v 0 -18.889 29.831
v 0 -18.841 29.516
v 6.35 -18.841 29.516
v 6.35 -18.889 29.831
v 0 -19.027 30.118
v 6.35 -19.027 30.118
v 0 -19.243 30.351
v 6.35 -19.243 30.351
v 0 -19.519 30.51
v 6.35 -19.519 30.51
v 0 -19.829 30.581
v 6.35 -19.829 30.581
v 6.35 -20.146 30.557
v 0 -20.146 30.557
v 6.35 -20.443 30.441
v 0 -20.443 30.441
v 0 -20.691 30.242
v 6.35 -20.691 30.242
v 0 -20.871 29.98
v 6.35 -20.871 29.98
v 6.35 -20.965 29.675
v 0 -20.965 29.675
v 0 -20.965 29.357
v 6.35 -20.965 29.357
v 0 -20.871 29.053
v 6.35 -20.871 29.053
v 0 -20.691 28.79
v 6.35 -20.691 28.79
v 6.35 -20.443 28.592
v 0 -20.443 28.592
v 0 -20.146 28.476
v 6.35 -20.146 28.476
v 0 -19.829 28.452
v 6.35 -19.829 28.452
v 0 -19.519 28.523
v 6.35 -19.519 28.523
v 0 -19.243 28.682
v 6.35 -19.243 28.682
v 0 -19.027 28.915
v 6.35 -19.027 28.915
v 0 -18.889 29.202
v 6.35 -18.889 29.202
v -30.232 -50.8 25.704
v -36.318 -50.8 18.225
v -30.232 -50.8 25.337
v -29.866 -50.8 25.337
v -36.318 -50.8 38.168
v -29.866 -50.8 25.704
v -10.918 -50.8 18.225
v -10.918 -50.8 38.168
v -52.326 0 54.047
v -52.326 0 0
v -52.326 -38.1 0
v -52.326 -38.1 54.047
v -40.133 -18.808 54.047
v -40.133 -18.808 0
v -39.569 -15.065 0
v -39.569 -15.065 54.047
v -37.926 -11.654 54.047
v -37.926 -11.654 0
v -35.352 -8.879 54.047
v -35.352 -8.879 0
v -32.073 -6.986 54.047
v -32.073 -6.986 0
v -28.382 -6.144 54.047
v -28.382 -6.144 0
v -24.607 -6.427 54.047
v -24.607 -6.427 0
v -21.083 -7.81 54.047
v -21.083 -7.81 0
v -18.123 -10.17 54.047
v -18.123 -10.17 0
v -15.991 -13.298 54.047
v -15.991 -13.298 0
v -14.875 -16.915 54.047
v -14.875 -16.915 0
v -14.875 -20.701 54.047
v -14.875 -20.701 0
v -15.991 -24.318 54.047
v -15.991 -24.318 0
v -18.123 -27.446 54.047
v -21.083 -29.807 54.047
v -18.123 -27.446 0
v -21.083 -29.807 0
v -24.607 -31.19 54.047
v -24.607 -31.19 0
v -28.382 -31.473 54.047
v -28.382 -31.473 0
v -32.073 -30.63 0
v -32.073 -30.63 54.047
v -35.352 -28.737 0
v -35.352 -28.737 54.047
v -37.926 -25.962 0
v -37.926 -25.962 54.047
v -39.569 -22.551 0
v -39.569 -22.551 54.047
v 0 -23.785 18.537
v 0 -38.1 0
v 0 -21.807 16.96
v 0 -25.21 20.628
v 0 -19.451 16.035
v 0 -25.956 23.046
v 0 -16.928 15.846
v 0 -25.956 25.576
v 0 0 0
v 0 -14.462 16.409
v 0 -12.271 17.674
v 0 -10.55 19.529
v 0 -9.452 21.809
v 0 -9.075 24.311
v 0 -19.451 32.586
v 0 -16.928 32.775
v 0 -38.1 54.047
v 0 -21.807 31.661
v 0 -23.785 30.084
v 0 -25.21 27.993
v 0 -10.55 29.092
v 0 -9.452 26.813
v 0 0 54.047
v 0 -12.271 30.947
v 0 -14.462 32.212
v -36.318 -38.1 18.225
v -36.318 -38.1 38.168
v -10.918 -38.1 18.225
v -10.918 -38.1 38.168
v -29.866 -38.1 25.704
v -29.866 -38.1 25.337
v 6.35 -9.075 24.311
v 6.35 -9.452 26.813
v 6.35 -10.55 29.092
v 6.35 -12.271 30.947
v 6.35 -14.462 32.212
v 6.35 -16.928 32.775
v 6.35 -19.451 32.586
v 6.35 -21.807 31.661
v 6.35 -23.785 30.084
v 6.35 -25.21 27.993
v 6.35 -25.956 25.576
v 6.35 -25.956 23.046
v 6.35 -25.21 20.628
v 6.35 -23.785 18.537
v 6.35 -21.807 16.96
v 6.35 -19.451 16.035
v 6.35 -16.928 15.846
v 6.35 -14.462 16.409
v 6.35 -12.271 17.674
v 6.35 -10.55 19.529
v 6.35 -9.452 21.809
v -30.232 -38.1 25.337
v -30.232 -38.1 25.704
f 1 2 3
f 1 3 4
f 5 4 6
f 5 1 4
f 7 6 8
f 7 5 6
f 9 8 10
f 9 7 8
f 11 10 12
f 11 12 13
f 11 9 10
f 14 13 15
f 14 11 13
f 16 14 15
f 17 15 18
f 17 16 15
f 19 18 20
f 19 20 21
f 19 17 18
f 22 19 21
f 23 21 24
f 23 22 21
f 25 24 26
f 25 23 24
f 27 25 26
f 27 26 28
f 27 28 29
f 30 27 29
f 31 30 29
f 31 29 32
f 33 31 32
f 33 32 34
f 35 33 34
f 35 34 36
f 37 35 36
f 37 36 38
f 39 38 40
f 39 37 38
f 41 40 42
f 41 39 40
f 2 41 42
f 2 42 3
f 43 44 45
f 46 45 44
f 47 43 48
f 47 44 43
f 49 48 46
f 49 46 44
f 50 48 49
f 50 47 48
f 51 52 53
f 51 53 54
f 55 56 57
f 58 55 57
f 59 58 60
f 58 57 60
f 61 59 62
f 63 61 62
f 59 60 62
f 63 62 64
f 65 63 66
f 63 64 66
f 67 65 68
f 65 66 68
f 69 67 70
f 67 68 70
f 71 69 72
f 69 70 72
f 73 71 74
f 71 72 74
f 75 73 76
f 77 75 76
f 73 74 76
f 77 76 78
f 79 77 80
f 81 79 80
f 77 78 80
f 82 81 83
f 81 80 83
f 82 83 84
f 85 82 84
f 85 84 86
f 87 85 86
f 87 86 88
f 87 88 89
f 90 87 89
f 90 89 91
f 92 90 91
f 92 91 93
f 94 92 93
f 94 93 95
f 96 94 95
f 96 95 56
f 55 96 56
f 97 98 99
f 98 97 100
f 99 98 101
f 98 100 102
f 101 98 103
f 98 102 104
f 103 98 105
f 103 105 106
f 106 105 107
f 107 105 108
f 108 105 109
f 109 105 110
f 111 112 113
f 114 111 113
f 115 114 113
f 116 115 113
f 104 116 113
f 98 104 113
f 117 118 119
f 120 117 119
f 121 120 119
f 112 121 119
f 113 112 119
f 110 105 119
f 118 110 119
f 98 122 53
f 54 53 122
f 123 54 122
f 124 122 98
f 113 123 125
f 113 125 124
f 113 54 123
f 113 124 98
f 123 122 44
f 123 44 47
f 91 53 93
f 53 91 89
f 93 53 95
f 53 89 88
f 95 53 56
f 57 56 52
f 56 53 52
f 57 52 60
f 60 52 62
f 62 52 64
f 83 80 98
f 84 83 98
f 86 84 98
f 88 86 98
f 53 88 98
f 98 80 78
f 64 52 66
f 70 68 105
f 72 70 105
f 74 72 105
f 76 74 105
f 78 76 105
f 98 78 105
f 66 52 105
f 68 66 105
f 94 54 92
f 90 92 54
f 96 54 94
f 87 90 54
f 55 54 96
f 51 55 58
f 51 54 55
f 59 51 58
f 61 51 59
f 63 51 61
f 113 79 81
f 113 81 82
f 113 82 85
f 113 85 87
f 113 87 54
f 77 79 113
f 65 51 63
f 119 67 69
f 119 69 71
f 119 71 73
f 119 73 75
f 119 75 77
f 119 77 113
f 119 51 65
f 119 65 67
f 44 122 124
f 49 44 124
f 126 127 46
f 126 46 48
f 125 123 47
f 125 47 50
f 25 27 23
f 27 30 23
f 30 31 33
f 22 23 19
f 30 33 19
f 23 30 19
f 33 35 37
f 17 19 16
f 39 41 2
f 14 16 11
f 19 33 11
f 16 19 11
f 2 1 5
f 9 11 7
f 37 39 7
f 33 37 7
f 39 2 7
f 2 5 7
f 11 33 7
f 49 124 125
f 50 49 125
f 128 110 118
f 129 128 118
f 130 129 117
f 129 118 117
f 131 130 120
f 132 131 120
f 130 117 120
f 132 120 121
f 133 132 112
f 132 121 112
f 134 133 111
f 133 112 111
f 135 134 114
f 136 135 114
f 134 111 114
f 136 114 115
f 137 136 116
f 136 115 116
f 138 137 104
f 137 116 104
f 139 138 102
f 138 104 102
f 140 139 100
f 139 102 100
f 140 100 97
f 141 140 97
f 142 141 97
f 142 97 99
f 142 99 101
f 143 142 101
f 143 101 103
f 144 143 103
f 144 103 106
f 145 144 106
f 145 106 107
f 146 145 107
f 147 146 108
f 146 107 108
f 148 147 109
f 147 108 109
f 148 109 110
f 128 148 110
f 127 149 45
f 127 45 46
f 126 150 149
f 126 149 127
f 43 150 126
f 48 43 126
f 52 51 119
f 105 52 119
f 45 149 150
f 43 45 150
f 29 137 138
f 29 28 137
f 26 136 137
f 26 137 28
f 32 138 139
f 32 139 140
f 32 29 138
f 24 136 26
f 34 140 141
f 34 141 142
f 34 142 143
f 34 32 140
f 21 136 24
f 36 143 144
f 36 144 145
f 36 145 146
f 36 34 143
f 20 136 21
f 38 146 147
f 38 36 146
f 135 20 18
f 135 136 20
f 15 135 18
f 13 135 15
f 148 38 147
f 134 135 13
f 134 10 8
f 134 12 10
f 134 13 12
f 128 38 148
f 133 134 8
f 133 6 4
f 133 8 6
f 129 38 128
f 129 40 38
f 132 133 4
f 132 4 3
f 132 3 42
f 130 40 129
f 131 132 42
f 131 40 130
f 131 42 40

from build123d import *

# Parameters (mm, degrees)
F0_W     = 52.326445
F0_H     = 54.046918
F1_DEPTH = 38.1
F3_D     = 25.4
F4_W     = 25.4
F4_H     = 19.942893
F4_W_2   = 0.366597
F4_H_2   = 0.366597
F5_DEPTH = 12.7
F6_R     = 8.487976
F6_R_2   = 1.067547
F7_DEPTH = 6.35


with BuildPart() as f1:
    # F0 (on Front) → F1 (new body)
    with BuildSketch(Plane.XZ):
        with Locations((-26.163222, 27.023459)):
            Rectangle(F0_W, F0_H)
    extrude(amount=F1_DEPTH)

    # F3 (through all)
    with Locations(Plane.XY.offset(54.046918)):
        with Locations((-27.433222, -18.808095)):
            Hole(F3_D / 2)

    # F4 (on face) → F5 (join)
    with BuildSketch(Plane.XZ.offset(38.1)):
        with Locations((-23.617967, 28.19657)):
            Rectangle(F4_W, F4_H)
        with Locations((-30.049153, 25.520409)):
            Rectangle(F4_W_2, F4_H_2, mode=Mode.SUBTRACT)
    extrude(amount=F5_DEPTH)

    # F6 (on face) → F7 (join)
    with BuildSketch(Plane.YZ):
        with Locations((-17.562686, 24.310639)):
            Circle(F6_R)
        with Locations((-19.908907, 29.516321)):
            Circle(F6_R_2, mode=Mode.SUBTRACT)
    extrude(amount=F7_DEPTH)


solid = f1.part
